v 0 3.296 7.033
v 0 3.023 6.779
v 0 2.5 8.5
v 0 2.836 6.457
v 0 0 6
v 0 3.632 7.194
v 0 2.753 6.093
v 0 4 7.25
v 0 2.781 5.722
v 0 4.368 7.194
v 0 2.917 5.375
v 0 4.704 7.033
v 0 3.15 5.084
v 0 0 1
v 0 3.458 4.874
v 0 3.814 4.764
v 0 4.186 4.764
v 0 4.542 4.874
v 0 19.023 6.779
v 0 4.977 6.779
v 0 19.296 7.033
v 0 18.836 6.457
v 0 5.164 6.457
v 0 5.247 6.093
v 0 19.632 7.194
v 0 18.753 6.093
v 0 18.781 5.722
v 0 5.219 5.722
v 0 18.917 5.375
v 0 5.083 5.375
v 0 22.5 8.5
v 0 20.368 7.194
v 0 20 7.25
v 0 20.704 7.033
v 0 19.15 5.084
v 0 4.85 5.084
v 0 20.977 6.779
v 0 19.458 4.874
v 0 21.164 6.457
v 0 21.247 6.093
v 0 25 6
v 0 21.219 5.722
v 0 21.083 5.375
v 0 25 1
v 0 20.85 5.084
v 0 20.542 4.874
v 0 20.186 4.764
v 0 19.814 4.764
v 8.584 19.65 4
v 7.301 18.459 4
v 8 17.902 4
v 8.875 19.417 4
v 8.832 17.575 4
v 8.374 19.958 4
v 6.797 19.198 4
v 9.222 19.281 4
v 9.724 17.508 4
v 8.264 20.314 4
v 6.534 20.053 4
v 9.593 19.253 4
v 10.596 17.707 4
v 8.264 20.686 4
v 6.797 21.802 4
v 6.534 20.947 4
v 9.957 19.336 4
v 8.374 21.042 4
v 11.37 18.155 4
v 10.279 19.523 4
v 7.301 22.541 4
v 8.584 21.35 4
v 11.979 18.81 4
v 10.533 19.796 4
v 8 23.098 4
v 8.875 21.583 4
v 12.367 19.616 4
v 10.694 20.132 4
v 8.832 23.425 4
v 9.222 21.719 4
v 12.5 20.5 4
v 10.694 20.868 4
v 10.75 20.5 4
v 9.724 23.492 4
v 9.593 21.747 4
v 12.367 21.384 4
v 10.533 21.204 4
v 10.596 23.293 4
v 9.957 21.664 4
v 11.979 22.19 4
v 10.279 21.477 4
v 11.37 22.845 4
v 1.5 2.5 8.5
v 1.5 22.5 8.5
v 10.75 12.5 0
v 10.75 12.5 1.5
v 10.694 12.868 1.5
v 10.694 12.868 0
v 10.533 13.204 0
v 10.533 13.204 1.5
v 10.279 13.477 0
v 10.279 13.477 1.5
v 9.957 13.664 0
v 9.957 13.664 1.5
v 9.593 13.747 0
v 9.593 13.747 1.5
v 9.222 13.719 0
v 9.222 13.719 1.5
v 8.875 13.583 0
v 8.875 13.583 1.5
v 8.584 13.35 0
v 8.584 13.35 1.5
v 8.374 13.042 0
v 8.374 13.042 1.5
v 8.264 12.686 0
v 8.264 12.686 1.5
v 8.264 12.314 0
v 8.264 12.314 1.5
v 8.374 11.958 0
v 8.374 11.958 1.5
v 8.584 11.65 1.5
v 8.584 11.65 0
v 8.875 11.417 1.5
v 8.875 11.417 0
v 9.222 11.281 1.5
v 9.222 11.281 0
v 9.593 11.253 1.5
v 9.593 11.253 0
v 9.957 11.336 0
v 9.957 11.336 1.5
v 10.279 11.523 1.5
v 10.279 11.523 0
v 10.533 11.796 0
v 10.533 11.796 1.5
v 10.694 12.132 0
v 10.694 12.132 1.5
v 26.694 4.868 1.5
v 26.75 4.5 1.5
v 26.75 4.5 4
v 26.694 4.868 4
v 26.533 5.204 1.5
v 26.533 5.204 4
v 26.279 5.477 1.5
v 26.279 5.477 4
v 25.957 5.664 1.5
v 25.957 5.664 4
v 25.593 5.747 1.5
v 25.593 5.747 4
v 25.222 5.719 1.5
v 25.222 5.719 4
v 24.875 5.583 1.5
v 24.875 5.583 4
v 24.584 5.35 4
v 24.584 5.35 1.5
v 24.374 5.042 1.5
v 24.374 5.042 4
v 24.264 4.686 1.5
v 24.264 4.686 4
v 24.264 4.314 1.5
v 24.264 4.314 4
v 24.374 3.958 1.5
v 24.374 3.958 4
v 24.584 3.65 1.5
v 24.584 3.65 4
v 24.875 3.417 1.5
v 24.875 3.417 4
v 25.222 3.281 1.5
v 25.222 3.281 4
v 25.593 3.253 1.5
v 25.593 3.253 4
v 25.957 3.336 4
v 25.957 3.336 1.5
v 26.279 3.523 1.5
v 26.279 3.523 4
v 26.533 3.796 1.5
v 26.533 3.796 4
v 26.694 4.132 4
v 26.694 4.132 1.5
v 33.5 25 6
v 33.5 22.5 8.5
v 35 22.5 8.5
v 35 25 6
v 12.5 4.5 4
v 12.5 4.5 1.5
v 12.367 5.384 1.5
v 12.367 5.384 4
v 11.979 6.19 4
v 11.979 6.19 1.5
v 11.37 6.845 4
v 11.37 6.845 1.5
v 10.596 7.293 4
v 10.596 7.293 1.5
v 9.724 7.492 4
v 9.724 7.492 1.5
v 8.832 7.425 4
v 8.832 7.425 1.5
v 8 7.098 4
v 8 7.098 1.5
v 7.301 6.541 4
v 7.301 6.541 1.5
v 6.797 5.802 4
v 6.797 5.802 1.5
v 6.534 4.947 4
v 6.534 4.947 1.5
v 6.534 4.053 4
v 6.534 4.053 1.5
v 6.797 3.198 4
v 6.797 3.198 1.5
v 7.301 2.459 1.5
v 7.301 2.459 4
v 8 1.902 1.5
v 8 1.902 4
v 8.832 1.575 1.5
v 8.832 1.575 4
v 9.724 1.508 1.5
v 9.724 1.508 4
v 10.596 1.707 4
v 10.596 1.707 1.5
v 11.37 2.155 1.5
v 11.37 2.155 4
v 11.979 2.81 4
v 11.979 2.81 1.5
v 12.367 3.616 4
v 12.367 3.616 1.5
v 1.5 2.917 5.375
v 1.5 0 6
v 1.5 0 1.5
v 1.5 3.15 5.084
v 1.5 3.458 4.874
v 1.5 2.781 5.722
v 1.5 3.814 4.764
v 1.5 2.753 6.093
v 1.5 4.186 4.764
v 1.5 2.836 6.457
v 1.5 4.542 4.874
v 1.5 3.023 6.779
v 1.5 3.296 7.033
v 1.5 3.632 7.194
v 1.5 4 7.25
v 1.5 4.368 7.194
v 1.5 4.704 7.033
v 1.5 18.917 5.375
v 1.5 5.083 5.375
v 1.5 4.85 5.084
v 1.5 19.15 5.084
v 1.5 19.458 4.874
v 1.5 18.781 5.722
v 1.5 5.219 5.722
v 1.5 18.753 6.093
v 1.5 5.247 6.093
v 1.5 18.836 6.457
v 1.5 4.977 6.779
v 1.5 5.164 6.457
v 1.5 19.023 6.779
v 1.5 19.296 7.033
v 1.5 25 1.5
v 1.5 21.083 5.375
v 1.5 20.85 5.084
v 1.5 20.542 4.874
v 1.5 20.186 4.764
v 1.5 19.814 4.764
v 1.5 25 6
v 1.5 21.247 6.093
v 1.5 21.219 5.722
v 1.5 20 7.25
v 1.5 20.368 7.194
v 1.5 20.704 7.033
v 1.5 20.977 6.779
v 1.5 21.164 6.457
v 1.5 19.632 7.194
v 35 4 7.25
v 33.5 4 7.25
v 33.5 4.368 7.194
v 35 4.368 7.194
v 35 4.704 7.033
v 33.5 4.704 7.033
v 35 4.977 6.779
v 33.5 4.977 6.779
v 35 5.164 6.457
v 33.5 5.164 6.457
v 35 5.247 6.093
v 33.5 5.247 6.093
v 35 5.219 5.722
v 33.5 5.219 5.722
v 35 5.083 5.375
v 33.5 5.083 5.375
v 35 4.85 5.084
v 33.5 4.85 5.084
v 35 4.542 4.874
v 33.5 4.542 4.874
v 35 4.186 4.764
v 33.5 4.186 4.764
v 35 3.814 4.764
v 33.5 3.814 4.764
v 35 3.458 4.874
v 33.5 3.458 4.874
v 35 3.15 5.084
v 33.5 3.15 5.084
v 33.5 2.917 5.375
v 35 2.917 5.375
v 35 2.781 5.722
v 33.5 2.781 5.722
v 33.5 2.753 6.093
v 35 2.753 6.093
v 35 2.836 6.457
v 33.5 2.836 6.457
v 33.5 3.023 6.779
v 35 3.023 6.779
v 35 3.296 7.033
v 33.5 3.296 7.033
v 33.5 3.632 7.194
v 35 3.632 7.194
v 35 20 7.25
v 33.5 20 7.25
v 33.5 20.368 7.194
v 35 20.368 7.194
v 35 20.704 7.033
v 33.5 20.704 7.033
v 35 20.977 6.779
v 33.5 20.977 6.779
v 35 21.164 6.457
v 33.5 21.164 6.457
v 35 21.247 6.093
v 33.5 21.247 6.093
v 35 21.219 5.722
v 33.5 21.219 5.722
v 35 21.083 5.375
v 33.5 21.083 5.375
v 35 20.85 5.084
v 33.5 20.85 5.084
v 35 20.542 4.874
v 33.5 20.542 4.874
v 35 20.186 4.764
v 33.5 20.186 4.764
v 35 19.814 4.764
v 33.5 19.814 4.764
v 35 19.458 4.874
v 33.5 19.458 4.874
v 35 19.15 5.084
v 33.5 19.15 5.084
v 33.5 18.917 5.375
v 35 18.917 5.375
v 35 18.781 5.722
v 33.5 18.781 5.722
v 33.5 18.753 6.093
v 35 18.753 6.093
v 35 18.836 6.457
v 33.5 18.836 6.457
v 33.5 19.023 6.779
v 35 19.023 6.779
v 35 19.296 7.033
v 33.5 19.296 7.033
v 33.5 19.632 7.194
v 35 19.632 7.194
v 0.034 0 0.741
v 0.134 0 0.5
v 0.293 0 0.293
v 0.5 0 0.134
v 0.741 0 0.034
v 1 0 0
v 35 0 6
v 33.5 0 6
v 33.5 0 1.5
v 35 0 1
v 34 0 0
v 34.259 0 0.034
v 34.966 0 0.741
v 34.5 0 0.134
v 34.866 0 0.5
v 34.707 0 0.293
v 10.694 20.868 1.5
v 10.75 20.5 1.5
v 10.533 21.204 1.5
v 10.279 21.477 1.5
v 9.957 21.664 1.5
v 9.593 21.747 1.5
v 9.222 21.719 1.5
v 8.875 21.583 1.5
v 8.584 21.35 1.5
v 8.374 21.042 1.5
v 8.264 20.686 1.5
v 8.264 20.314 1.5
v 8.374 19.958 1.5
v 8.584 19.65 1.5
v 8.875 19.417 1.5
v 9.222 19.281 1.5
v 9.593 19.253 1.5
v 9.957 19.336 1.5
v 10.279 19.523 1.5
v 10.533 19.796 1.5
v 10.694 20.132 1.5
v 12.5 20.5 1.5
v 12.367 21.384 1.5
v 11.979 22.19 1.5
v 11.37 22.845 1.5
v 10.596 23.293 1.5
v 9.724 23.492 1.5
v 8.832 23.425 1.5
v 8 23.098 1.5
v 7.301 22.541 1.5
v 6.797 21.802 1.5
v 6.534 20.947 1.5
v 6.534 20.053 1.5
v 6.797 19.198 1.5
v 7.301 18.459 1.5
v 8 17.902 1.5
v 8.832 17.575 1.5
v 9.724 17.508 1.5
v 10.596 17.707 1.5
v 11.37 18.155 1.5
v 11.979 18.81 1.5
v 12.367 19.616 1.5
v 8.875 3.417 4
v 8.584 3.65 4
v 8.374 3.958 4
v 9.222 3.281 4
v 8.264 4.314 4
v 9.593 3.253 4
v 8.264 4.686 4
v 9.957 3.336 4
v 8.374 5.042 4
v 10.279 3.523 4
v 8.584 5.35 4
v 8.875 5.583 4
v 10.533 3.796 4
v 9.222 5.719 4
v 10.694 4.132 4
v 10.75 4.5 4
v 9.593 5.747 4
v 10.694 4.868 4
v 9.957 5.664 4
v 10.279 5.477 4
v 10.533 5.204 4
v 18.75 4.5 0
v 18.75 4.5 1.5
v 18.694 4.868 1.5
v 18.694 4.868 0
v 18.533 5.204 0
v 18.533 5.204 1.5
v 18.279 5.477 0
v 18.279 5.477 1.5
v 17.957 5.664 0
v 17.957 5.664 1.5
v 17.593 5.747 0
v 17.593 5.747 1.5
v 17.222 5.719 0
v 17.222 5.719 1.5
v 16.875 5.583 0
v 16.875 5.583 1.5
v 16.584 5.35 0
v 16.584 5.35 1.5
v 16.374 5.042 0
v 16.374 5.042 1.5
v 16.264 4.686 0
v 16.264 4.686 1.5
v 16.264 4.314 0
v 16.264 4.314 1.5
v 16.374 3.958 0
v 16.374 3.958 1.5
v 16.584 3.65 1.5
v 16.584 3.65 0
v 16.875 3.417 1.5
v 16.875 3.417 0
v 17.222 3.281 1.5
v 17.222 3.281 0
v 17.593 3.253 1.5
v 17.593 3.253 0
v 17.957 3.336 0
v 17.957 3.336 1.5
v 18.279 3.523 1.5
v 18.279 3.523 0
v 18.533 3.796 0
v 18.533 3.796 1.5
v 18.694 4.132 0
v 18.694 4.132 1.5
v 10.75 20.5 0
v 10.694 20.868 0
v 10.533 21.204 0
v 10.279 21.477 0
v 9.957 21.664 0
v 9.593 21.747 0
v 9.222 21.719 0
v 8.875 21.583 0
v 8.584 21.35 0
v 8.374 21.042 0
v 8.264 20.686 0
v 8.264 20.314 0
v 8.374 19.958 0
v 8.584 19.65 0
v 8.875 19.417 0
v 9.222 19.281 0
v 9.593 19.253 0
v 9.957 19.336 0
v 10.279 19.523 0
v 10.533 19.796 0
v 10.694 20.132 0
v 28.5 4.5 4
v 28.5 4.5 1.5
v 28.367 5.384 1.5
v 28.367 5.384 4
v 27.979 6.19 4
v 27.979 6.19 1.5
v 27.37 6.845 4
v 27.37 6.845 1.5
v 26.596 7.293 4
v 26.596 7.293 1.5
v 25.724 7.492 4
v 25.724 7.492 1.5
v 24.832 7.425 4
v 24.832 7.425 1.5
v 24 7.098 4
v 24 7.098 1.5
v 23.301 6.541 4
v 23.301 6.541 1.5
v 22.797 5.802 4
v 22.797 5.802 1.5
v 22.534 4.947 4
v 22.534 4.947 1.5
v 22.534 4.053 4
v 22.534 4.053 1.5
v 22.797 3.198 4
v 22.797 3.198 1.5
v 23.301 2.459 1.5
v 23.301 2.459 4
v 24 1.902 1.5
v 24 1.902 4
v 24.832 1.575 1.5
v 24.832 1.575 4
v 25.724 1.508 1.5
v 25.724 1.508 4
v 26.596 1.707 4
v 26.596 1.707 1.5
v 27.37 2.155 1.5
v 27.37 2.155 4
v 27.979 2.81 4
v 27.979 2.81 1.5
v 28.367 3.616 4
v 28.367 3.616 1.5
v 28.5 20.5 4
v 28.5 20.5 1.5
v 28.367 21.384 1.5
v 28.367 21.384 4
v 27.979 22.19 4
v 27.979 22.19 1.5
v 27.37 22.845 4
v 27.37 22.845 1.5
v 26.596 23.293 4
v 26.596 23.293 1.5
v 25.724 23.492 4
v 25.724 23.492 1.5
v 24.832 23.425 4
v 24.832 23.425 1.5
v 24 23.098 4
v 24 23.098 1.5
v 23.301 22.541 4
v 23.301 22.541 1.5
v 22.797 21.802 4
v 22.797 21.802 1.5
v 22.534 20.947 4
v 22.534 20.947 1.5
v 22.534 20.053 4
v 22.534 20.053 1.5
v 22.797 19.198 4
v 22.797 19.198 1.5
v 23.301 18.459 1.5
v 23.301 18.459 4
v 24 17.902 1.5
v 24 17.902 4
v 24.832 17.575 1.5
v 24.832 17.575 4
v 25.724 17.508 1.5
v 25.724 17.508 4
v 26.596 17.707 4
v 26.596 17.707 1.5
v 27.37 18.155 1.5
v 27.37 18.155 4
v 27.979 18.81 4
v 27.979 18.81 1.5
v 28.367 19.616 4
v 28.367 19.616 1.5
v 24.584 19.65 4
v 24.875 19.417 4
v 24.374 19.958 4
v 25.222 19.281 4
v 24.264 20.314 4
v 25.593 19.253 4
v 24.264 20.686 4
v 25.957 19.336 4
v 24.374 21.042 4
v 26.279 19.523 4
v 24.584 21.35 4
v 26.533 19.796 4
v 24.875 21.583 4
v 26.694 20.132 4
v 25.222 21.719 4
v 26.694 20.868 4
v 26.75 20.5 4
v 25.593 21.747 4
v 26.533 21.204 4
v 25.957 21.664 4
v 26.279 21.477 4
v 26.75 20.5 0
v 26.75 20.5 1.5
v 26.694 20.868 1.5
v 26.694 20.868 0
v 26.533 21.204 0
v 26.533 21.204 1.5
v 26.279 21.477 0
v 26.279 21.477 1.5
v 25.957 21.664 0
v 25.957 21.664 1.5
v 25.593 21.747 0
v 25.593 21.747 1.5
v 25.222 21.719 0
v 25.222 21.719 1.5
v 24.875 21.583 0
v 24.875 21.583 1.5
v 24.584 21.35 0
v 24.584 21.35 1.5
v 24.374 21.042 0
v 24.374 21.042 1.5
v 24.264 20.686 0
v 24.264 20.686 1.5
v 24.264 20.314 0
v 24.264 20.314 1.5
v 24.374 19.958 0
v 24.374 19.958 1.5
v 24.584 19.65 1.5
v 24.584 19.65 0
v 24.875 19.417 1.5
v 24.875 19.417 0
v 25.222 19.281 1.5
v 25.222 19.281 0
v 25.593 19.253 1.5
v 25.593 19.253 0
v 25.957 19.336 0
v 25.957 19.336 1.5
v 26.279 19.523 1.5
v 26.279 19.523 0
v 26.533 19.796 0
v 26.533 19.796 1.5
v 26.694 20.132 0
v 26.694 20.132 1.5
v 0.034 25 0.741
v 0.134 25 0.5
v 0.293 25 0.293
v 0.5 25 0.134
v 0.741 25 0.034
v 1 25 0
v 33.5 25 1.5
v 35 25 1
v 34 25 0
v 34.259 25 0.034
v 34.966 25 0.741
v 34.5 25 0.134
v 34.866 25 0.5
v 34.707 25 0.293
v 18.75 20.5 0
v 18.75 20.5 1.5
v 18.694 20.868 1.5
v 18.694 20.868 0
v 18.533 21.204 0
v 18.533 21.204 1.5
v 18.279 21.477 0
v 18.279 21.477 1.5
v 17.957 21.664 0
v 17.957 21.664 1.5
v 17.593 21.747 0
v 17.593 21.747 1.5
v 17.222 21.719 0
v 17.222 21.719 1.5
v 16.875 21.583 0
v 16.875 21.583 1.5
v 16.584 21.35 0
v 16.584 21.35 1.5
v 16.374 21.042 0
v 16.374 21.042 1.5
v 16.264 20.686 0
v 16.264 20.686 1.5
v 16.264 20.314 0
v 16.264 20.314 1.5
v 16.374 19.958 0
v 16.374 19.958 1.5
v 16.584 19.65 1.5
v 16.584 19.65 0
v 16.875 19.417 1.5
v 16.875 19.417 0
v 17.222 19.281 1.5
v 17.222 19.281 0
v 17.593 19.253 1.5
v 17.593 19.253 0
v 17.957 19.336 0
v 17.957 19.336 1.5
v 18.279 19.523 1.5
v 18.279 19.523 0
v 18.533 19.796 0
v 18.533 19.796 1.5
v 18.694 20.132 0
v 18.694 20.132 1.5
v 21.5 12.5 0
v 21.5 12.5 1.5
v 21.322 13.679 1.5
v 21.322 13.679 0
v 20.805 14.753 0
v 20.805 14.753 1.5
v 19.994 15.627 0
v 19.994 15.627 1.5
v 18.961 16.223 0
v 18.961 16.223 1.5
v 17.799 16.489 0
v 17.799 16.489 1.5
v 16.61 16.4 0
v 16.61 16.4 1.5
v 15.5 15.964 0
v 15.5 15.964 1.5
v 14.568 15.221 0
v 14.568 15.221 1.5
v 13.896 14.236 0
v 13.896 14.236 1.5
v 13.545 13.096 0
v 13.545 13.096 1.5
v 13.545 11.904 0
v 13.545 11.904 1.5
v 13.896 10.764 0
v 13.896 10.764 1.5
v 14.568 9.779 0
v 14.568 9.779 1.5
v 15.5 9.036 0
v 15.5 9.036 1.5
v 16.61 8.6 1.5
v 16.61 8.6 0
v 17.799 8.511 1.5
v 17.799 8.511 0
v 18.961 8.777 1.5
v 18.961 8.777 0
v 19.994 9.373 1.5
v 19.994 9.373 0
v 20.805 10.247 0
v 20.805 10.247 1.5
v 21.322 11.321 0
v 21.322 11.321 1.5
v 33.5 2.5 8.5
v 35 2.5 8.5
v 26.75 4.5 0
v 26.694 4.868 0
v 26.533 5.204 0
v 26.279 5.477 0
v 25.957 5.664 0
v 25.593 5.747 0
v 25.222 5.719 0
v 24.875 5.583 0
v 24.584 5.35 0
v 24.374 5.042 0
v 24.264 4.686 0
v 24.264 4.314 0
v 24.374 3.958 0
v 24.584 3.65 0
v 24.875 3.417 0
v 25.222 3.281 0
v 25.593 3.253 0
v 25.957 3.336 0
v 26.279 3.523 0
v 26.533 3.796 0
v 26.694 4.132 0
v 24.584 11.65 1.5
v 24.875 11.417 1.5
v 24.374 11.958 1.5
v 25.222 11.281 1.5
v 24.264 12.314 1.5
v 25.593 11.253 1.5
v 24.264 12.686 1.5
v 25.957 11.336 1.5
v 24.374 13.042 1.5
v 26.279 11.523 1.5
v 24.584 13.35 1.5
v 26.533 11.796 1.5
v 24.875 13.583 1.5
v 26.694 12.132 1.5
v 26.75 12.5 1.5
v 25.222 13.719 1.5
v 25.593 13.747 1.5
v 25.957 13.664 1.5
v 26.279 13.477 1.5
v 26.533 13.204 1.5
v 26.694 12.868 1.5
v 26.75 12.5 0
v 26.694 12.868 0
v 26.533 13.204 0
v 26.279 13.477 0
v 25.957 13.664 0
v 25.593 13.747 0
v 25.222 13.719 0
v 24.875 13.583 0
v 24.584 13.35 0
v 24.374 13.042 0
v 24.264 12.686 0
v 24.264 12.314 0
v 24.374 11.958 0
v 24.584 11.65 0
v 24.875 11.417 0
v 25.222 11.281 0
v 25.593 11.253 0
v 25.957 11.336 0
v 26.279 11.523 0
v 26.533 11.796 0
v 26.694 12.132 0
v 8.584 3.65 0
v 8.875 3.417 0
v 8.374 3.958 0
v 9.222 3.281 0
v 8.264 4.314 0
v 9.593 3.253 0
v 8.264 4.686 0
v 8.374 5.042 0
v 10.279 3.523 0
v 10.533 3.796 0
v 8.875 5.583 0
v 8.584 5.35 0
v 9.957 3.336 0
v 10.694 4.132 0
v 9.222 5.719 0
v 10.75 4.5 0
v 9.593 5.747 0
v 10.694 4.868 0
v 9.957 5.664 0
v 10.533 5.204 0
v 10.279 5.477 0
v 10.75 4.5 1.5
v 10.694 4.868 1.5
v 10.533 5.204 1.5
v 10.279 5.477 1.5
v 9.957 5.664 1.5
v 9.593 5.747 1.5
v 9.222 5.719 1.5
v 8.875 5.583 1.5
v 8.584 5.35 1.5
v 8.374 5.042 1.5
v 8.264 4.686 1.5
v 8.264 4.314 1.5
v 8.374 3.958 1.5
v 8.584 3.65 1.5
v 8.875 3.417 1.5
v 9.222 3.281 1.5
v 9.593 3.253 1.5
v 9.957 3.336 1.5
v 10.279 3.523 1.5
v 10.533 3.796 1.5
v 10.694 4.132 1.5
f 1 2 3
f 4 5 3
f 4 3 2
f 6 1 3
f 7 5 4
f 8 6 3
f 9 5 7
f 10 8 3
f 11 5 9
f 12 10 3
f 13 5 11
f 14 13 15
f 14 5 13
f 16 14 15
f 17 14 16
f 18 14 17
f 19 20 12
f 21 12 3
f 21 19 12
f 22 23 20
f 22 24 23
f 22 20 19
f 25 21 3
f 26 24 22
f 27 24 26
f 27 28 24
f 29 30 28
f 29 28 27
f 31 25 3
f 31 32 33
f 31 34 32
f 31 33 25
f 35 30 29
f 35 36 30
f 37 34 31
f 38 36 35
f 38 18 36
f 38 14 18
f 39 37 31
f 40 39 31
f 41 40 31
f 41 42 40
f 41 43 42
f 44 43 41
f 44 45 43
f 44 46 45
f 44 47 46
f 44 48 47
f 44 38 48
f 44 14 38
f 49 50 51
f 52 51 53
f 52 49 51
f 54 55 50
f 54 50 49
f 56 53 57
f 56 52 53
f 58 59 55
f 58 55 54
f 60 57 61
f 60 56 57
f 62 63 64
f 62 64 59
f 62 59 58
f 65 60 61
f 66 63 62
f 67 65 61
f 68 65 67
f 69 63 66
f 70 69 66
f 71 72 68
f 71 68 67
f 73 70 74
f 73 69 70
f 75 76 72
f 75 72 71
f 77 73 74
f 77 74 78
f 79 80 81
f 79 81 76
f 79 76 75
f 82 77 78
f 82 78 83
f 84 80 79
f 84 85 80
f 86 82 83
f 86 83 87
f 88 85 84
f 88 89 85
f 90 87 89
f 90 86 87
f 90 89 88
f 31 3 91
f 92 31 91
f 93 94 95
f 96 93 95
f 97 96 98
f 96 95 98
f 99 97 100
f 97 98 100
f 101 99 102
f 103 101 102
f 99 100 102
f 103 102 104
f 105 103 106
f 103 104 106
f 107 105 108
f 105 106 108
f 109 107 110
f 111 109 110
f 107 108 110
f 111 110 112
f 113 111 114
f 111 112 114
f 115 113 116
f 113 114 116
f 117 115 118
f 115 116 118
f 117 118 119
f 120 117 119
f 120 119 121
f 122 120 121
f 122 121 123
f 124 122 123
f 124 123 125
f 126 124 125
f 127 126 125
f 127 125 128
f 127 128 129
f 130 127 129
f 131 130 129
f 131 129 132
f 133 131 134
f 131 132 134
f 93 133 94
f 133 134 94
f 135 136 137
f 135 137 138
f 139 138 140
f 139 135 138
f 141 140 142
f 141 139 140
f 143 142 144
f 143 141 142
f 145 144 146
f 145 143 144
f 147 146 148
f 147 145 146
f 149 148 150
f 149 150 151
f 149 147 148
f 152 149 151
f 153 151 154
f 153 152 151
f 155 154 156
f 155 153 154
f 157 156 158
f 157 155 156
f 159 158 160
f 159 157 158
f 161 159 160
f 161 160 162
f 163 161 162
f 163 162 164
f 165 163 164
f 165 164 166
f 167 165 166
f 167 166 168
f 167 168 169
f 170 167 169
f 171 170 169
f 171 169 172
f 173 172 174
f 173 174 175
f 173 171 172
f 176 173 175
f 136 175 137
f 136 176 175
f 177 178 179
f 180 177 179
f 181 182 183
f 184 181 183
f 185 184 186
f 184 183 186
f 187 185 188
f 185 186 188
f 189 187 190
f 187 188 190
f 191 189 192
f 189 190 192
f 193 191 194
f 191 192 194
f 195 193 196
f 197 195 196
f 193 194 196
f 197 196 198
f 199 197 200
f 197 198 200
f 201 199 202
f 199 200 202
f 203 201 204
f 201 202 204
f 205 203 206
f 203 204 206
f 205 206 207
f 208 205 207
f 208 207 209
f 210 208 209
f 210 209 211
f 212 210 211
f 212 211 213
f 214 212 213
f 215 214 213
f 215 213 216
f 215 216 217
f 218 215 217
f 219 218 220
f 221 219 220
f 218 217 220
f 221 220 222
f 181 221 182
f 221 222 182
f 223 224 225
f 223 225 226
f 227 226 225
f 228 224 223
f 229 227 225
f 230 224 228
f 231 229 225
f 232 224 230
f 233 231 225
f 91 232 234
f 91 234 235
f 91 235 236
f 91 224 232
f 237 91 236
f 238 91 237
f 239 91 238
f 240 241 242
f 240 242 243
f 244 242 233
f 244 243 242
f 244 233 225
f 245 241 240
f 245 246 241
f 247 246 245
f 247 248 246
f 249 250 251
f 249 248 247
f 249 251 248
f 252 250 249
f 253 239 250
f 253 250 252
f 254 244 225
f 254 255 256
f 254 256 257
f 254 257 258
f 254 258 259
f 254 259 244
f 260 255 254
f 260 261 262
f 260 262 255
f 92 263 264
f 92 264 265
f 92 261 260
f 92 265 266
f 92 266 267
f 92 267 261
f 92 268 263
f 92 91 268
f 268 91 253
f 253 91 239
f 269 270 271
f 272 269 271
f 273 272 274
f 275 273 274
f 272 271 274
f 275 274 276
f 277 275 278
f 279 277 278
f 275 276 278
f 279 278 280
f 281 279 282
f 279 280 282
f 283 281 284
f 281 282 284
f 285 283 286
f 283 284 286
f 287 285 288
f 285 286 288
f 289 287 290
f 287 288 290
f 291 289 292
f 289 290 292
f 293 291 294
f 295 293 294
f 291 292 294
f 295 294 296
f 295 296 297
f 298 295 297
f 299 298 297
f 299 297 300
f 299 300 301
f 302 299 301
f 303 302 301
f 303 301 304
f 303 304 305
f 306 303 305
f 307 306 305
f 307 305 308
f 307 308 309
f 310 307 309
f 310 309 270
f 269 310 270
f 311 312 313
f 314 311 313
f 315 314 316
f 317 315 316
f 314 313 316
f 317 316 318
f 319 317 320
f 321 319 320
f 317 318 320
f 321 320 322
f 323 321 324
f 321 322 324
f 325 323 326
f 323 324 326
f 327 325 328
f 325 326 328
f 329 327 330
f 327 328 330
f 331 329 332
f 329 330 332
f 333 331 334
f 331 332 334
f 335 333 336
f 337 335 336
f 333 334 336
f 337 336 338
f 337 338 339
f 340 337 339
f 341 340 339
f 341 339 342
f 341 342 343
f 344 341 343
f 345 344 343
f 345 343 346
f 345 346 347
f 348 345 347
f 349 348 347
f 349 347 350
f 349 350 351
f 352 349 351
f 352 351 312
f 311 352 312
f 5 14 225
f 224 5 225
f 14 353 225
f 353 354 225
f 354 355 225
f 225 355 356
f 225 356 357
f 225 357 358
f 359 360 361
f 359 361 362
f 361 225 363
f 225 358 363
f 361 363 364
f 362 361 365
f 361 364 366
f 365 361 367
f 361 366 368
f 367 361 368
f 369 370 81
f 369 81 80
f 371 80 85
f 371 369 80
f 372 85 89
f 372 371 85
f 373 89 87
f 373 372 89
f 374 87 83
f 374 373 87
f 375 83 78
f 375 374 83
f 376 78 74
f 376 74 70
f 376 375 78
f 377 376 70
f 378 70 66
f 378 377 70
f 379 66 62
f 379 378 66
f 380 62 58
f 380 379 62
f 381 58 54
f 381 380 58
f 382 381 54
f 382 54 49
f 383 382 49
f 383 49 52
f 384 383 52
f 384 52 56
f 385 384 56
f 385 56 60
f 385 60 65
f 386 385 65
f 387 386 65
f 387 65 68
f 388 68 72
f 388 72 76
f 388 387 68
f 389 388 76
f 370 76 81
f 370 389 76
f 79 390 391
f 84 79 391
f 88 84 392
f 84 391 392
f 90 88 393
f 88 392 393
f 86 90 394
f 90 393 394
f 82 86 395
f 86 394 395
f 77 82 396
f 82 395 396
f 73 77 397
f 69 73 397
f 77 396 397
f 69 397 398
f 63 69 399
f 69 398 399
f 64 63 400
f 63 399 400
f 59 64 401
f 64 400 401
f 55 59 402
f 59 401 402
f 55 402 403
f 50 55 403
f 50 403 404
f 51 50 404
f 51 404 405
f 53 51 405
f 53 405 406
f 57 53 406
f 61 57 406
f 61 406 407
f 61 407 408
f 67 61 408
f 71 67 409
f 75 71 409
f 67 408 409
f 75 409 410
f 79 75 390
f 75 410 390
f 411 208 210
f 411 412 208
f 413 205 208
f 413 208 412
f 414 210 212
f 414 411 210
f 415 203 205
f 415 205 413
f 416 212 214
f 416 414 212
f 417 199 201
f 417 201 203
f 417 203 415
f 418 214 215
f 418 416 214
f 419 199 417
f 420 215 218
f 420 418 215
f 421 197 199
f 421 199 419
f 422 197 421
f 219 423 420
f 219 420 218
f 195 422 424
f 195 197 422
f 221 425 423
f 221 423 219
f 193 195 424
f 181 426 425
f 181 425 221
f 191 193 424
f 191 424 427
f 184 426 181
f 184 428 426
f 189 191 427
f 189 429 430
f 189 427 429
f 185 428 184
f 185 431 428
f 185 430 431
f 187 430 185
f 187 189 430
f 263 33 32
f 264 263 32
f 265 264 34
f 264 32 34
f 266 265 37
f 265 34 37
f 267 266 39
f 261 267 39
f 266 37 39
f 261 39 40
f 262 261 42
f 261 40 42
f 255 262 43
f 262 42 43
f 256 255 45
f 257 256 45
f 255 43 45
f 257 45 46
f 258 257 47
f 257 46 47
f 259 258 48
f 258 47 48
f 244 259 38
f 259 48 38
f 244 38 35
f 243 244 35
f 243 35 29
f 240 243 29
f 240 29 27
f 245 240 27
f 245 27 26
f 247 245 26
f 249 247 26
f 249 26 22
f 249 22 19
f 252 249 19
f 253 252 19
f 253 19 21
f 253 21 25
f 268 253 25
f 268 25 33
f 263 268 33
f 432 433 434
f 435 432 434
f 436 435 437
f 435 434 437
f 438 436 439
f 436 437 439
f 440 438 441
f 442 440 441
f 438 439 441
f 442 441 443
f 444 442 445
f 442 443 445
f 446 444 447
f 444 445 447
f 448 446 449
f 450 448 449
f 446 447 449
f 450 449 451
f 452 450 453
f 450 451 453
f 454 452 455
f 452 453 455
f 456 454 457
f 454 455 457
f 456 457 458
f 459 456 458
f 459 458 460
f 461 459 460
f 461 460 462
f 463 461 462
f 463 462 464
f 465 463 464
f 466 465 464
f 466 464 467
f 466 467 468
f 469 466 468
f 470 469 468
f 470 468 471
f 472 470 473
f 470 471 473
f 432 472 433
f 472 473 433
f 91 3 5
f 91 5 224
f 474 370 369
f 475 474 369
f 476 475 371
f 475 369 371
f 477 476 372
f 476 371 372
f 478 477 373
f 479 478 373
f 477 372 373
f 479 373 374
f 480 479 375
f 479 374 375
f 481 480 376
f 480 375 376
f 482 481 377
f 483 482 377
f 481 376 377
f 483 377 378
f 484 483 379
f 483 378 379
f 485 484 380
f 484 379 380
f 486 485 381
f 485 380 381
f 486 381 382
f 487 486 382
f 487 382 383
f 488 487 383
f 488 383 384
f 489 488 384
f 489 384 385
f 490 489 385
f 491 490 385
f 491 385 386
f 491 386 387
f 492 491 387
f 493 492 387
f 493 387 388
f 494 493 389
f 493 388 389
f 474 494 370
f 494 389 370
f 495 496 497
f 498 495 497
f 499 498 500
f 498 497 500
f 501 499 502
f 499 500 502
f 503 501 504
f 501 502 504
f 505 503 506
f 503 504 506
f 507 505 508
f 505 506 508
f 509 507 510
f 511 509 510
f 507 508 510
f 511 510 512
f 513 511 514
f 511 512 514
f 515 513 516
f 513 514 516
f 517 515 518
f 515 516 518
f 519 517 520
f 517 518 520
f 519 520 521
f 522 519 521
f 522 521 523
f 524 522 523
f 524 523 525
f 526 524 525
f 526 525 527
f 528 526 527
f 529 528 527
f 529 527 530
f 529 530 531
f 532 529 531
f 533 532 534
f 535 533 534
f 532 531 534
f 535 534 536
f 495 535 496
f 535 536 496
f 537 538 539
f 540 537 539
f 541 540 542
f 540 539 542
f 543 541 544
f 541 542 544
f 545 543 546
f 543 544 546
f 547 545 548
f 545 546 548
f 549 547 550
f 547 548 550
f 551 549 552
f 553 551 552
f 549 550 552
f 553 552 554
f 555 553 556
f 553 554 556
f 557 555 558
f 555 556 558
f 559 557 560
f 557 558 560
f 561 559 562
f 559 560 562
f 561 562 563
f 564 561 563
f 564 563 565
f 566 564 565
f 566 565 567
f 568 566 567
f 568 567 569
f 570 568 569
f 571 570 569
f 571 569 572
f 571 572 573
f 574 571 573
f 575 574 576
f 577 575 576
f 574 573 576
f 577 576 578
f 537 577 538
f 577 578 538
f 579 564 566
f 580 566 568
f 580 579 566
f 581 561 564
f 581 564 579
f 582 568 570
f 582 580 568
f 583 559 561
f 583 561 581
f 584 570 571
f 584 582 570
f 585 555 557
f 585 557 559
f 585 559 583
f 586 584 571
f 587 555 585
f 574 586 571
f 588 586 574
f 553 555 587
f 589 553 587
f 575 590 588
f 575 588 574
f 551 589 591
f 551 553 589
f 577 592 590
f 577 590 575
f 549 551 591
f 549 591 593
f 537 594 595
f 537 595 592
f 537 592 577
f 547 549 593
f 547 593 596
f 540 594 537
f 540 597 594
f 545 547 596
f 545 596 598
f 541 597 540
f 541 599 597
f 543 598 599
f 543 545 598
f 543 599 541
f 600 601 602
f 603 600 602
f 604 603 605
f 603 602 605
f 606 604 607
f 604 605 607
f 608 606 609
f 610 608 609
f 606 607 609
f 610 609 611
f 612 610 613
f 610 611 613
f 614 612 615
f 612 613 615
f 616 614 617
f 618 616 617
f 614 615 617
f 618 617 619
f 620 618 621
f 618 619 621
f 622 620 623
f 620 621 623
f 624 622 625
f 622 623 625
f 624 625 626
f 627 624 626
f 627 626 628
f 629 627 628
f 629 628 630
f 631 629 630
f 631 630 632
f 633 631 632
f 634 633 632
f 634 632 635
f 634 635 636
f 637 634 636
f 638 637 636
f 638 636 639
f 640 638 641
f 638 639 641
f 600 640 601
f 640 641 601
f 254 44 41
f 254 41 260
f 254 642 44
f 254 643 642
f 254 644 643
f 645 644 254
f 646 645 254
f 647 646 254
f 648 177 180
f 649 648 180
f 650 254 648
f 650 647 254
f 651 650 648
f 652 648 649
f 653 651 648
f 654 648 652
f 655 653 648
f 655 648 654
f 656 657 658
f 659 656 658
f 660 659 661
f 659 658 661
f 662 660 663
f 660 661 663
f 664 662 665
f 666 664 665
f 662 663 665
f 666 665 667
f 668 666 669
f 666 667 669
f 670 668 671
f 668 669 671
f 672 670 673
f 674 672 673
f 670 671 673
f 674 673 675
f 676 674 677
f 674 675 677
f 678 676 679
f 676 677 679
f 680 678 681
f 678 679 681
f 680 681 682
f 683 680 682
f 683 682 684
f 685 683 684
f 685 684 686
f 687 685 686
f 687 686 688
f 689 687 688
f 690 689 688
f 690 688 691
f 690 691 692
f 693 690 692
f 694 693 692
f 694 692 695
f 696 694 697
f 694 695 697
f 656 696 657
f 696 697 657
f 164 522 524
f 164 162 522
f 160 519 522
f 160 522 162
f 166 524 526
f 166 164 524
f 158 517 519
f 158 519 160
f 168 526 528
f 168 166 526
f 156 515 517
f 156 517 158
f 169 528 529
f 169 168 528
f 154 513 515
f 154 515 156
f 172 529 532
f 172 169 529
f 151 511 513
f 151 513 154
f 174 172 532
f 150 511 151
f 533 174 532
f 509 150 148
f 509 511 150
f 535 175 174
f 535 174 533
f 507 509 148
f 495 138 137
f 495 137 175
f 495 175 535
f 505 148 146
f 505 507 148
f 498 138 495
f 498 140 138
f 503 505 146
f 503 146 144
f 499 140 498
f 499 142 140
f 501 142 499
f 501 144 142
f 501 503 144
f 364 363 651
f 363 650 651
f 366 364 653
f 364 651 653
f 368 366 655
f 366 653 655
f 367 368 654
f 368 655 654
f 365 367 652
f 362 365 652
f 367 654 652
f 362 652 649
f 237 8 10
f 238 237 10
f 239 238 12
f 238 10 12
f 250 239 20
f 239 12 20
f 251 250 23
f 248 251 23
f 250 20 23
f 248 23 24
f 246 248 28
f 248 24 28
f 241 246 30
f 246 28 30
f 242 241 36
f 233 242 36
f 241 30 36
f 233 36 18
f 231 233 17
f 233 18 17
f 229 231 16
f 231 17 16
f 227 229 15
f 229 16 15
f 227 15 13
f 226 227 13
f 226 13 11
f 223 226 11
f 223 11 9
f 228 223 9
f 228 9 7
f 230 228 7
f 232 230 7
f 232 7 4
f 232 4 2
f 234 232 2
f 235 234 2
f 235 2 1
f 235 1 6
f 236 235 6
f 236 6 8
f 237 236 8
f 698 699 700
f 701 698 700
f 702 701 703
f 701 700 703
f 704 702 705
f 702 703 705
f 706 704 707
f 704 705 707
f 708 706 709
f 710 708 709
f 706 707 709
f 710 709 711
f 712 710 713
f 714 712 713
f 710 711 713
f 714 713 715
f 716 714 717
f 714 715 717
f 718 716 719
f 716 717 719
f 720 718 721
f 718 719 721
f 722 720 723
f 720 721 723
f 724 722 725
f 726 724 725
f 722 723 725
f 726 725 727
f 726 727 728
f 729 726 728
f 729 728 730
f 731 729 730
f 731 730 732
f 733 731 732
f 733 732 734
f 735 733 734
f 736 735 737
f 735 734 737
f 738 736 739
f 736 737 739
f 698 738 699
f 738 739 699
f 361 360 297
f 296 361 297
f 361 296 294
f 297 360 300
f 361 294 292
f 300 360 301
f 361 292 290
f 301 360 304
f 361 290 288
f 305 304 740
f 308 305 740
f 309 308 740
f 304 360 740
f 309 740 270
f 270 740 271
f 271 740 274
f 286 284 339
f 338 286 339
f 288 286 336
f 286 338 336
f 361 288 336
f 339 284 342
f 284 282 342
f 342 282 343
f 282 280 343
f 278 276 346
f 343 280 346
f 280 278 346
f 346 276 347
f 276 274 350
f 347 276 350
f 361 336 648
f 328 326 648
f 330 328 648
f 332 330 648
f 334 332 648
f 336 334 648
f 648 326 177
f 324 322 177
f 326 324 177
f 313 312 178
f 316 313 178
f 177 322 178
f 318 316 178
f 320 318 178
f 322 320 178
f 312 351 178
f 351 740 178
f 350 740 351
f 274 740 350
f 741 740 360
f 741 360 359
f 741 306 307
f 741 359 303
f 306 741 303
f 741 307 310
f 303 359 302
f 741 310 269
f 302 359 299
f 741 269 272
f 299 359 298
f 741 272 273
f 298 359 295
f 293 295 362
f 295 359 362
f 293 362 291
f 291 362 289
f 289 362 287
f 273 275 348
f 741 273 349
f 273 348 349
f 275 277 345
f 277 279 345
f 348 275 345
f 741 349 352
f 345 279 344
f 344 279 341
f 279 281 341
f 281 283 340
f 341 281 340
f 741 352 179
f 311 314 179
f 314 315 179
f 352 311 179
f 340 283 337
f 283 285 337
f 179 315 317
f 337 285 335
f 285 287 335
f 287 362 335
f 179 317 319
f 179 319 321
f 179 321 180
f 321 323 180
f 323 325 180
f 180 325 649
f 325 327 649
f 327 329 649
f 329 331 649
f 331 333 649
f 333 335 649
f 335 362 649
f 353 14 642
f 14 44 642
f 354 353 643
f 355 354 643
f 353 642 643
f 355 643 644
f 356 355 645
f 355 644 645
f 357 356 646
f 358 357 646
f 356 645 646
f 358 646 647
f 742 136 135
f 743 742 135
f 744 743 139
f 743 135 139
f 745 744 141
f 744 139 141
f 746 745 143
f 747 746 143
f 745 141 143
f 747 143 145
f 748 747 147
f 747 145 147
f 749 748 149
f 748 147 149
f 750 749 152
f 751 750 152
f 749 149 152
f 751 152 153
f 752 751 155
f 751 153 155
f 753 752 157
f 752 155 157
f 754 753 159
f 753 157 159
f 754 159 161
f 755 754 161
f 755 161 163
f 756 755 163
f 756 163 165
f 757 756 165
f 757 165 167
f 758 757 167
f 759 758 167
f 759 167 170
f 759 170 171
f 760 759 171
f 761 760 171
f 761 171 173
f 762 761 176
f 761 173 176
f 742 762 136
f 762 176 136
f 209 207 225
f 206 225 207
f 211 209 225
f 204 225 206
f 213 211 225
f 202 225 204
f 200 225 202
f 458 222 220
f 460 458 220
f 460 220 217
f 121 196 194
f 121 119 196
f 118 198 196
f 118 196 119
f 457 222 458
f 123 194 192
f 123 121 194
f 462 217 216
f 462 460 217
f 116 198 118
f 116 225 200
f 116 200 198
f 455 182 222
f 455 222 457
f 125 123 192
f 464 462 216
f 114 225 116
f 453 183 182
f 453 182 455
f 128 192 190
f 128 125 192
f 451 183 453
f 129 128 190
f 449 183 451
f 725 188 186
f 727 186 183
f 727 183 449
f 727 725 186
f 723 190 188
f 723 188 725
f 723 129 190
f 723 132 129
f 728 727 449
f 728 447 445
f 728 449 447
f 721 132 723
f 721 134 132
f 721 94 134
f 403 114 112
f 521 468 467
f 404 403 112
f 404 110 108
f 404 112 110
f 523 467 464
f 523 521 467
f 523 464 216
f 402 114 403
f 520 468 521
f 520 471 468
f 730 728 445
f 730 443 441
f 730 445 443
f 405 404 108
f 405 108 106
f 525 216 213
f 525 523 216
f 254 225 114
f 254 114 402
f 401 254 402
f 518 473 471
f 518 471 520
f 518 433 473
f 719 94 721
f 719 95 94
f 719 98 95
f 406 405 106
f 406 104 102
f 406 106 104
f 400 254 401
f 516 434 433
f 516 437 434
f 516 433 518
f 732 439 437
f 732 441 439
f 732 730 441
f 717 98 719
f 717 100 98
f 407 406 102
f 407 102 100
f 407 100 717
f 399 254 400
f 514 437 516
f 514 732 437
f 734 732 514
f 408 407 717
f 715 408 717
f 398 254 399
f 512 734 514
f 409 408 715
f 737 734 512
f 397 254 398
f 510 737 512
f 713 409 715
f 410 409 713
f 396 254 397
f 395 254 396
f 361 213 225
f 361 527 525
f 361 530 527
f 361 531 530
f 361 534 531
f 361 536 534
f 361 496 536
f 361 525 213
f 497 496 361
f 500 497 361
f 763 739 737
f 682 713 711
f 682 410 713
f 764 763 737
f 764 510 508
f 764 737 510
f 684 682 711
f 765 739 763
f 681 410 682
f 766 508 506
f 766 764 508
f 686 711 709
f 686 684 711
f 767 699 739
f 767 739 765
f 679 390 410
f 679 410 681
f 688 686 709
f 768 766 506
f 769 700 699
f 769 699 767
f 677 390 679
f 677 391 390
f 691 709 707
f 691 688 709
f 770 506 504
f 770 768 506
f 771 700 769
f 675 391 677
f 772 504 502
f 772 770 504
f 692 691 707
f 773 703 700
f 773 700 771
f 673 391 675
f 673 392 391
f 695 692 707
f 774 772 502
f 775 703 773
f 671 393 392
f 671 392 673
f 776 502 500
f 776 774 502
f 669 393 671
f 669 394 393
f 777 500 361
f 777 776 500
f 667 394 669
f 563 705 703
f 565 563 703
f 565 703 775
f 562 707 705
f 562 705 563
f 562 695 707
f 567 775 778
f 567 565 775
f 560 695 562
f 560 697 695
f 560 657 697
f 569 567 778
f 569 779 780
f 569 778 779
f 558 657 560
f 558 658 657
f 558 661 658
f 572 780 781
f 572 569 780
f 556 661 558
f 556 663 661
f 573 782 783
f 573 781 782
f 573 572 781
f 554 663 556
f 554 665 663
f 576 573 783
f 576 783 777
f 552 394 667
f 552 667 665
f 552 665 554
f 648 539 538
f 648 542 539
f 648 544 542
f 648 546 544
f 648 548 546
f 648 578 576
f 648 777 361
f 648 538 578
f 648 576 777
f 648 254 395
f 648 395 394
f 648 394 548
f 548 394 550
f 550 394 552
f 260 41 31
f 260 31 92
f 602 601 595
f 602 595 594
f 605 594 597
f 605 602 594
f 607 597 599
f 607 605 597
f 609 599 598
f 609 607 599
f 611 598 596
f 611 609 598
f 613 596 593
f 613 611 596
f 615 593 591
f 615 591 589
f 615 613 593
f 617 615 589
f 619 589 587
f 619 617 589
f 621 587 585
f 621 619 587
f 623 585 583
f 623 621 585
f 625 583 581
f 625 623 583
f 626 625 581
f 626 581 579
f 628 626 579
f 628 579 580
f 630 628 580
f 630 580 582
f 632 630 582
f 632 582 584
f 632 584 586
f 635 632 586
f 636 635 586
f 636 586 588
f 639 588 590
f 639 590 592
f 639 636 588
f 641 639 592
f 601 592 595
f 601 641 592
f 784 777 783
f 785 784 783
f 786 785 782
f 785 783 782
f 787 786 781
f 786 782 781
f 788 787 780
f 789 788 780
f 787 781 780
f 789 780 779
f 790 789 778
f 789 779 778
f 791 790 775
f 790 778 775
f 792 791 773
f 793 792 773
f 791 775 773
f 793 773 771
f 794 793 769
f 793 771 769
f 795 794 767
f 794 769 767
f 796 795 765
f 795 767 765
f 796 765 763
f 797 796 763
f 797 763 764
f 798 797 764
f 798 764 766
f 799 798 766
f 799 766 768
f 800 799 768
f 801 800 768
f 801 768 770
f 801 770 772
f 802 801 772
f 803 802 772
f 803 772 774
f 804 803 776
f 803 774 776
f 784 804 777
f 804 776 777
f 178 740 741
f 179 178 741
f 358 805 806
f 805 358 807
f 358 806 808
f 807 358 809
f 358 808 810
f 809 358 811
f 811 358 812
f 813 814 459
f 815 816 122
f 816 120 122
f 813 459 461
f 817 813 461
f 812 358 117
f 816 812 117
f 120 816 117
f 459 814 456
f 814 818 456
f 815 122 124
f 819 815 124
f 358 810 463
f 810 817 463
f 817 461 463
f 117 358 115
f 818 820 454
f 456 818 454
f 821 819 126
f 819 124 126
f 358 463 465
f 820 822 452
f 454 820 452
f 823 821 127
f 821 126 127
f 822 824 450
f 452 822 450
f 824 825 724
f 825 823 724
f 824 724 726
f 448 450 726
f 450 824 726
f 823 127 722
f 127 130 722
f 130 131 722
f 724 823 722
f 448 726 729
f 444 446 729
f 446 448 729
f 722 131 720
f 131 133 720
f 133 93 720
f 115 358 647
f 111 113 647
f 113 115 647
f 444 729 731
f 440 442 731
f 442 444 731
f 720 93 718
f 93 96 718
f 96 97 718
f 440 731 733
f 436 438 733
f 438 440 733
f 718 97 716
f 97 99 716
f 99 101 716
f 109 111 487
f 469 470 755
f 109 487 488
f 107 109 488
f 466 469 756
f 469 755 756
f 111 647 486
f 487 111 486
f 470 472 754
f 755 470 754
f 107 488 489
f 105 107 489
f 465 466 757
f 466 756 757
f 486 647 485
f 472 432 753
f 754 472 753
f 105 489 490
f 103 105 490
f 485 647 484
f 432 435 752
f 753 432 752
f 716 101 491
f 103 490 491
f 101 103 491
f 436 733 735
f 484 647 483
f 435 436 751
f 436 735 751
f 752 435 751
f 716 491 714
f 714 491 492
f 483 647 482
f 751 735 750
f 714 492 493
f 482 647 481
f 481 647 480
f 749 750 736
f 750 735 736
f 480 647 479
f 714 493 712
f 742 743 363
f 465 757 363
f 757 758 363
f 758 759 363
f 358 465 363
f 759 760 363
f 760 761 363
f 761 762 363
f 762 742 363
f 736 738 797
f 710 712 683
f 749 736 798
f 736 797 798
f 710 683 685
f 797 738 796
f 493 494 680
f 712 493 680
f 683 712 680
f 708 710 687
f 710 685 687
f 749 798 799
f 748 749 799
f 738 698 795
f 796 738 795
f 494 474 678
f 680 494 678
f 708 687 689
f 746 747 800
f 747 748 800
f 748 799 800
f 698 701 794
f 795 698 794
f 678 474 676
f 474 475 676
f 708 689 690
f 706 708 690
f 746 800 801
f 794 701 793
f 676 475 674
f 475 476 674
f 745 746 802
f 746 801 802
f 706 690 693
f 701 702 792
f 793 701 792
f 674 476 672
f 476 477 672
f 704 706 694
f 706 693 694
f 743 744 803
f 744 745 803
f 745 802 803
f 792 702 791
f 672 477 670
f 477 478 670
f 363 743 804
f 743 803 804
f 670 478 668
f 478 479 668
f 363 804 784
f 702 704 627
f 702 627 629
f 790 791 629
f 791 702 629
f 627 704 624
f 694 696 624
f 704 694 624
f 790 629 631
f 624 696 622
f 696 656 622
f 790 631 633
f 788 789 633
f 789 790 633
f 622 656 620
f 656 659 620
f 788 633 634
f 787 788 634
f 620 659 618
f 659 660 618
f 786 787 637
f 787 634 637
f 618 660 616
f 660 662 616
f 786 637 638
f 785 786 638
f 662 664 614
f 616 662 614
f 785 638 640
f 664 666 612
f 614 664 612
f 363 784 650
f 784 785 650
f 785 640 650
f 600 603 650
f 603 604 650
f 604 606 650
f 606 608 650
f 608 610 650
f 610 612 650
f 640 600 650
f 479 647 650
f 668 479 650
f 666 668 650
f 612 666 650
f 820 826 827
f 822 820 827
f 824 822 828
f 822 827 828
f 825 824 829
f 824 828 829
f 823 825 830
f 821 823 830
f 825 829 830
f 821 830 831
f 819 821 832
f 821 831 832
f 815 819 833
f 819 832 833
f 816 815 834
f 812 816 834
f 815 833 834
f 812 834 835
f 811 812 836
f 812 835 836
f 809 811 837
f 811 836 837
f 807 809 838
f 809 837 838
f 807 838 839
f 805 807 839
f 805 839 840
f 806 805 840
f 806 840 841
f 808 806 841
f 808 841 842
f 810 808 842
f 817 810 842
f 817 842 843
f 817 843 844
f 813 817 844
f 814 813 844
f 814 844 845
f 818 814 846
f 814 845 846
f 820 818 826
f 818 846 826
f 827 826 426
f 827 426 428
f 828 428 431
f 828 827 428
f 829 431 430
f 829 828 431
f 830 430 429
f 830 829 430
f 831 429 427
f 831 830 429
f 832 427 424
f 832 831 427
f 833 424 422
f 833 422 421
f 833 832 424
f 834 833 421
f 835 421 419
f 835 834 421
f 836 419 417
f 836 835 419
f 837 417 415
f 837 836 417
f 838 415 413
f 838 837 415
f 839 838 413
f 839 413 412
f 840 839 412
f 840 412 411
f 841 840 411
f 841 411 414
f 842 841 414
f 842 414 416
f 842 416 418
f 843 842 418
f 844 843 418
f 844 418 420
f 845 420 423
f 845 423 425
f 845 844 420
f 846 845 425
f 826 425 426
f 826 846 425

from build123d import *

# Parameters (mm, degrees)
SKETCH1_W               = 35
SKETCH1_H               = 25
BOSS_EXTRUDE1_DEPTH     = 8.5
SKETCH3_W               = 32
SKETCH3_H               = 25
CUT_EXTRUDE1_DEPTH      = 7
FILLET1_R               = 1
CHAMFER1_SIZE           = 2.5
SKETCH4_R               = 1.25
CUT_EXTRUDE2_DEPTH      = 35
SKETCH5_R               = 3
BOSS_EXTRUDE3_DEPTH     = 2.5
SKETCH7_R               = 4
SKETCH7_R_2             = 1.25
CUT_EXTRUDE3_DEPTH      = 2.5
CUT_EXTRUDE3_DEPTH_BACK = 1.5


with BuildPart() as part:
    # Sketch1 → Boss-Extrude1 (new body)
    with BuildSketch(Plane.XY):
        with Locations((17.5, 12.5)):
            Rectangle(SKETCH1_W, SKETCH1_H)
    extrude(amount=BOSS_EXTRUDE1_DEPTH)

    # Sketch3 → Cut-Extrude1 (cut)
    with BuildSketch(Plane.XY.offset(8.5)):
        with Locations((17.5, 12.5)):
            Rectangle(SKETCH3_W, SKETCH3_H)
    extrude(amount=-CUT_EXTRUDE1_DEPTH, mode=Mode.SUBTRACT)

    # Fillet1
    fillet1_edges = [part.edges().sort_by_distance(p)[0] for p in [
        (0, 12.5, 0),
        (35, 12.5, 0),
    ]]
    fillet(fillet1_edges, radius=FILLET1_R)

    # Chamfer1
    chamfer1_edges = [part.edges().sort_by_distance(p)[0] for p in [
        (0.75, 0, 8.5),
        (0.75, 25, 8.5),
        (34.25, 0, 8.5),
        (34.25, 25, 8.5),
    ]]
    chamfer(chamfer1_edges, length=CHAMFER1_SIZE)

    # Sketch4 → Cut-Extrude2 (cut)
    with BuildSketch(Plane.ZY):
        with Locations((6, 20)):
            Circle(SKETCH4_R)
        with Locations((6, 4)):
            Circle(SKETCH4_R)
    extrude(amount=-CUT_EXTRUDE2_DEPTH, mode=Mode.SUBTRACT)

    # Sketch5 → Boss-Extrude3 (add)
    with BuildSketch(Plane.XY.offset(1.5)):
        with Locations((9.5, 4.5)):
            Circle(SKETCH5_R)
        with Locations((25.5, 4.5)):
            Circle(SKETCH5_R)
        with Locations((25.499999171, 20.5)):
            Circle(SKETCH5_R)
        with Locations((9.499999171, 20.5)):
            Circle(SKETCH5_R)
    extrude(amount=BOSS_EXTRUDE3_DEPTH)

    # Sketch7 → Cut-Extrude3 (cut, two sides)
    with BuildSketch(Plane.XY.offset(1.5)) as cut_extrude3_sk:
        with Locations((17.5, 12.5)):
            Circle(SKETCH7_R)
        with Locations((9.5, 4.5)):
            Circle(SKETCH7_R_2)
        with Locations((17.5, 4.5)):
            Circle(SKETCH7_R_2)
        with Locations((25.5, 4.5)):
            Circle(SKETCH7_R_2)
        with Locations((25.5, 12.5)):
            Circle(SKETCH7_R_2)
        with Locations((17.5, 20.5)):
            Circle(SKETCH7_R_2)
        with Locations((25.5, 20.5)):
            Circle(SKETCH7_R_2)
        with Locations((9.5, 12.5)):
            Circle(SKETCH7_R_2)
        with Locations((9.5, 20.5)):
            Circle(SKETCH7_R_2)
    extrude(amount=CUT_EXTRUDE3_DEPTH, mode=Mode.SUBTRACT)
    extrude(cut_extrude3_sk.sketch, amount=-CUT_EXTRUDE3_DEPTH_BACK, mode=Mode.SUBTRACT)


solid = part.part
